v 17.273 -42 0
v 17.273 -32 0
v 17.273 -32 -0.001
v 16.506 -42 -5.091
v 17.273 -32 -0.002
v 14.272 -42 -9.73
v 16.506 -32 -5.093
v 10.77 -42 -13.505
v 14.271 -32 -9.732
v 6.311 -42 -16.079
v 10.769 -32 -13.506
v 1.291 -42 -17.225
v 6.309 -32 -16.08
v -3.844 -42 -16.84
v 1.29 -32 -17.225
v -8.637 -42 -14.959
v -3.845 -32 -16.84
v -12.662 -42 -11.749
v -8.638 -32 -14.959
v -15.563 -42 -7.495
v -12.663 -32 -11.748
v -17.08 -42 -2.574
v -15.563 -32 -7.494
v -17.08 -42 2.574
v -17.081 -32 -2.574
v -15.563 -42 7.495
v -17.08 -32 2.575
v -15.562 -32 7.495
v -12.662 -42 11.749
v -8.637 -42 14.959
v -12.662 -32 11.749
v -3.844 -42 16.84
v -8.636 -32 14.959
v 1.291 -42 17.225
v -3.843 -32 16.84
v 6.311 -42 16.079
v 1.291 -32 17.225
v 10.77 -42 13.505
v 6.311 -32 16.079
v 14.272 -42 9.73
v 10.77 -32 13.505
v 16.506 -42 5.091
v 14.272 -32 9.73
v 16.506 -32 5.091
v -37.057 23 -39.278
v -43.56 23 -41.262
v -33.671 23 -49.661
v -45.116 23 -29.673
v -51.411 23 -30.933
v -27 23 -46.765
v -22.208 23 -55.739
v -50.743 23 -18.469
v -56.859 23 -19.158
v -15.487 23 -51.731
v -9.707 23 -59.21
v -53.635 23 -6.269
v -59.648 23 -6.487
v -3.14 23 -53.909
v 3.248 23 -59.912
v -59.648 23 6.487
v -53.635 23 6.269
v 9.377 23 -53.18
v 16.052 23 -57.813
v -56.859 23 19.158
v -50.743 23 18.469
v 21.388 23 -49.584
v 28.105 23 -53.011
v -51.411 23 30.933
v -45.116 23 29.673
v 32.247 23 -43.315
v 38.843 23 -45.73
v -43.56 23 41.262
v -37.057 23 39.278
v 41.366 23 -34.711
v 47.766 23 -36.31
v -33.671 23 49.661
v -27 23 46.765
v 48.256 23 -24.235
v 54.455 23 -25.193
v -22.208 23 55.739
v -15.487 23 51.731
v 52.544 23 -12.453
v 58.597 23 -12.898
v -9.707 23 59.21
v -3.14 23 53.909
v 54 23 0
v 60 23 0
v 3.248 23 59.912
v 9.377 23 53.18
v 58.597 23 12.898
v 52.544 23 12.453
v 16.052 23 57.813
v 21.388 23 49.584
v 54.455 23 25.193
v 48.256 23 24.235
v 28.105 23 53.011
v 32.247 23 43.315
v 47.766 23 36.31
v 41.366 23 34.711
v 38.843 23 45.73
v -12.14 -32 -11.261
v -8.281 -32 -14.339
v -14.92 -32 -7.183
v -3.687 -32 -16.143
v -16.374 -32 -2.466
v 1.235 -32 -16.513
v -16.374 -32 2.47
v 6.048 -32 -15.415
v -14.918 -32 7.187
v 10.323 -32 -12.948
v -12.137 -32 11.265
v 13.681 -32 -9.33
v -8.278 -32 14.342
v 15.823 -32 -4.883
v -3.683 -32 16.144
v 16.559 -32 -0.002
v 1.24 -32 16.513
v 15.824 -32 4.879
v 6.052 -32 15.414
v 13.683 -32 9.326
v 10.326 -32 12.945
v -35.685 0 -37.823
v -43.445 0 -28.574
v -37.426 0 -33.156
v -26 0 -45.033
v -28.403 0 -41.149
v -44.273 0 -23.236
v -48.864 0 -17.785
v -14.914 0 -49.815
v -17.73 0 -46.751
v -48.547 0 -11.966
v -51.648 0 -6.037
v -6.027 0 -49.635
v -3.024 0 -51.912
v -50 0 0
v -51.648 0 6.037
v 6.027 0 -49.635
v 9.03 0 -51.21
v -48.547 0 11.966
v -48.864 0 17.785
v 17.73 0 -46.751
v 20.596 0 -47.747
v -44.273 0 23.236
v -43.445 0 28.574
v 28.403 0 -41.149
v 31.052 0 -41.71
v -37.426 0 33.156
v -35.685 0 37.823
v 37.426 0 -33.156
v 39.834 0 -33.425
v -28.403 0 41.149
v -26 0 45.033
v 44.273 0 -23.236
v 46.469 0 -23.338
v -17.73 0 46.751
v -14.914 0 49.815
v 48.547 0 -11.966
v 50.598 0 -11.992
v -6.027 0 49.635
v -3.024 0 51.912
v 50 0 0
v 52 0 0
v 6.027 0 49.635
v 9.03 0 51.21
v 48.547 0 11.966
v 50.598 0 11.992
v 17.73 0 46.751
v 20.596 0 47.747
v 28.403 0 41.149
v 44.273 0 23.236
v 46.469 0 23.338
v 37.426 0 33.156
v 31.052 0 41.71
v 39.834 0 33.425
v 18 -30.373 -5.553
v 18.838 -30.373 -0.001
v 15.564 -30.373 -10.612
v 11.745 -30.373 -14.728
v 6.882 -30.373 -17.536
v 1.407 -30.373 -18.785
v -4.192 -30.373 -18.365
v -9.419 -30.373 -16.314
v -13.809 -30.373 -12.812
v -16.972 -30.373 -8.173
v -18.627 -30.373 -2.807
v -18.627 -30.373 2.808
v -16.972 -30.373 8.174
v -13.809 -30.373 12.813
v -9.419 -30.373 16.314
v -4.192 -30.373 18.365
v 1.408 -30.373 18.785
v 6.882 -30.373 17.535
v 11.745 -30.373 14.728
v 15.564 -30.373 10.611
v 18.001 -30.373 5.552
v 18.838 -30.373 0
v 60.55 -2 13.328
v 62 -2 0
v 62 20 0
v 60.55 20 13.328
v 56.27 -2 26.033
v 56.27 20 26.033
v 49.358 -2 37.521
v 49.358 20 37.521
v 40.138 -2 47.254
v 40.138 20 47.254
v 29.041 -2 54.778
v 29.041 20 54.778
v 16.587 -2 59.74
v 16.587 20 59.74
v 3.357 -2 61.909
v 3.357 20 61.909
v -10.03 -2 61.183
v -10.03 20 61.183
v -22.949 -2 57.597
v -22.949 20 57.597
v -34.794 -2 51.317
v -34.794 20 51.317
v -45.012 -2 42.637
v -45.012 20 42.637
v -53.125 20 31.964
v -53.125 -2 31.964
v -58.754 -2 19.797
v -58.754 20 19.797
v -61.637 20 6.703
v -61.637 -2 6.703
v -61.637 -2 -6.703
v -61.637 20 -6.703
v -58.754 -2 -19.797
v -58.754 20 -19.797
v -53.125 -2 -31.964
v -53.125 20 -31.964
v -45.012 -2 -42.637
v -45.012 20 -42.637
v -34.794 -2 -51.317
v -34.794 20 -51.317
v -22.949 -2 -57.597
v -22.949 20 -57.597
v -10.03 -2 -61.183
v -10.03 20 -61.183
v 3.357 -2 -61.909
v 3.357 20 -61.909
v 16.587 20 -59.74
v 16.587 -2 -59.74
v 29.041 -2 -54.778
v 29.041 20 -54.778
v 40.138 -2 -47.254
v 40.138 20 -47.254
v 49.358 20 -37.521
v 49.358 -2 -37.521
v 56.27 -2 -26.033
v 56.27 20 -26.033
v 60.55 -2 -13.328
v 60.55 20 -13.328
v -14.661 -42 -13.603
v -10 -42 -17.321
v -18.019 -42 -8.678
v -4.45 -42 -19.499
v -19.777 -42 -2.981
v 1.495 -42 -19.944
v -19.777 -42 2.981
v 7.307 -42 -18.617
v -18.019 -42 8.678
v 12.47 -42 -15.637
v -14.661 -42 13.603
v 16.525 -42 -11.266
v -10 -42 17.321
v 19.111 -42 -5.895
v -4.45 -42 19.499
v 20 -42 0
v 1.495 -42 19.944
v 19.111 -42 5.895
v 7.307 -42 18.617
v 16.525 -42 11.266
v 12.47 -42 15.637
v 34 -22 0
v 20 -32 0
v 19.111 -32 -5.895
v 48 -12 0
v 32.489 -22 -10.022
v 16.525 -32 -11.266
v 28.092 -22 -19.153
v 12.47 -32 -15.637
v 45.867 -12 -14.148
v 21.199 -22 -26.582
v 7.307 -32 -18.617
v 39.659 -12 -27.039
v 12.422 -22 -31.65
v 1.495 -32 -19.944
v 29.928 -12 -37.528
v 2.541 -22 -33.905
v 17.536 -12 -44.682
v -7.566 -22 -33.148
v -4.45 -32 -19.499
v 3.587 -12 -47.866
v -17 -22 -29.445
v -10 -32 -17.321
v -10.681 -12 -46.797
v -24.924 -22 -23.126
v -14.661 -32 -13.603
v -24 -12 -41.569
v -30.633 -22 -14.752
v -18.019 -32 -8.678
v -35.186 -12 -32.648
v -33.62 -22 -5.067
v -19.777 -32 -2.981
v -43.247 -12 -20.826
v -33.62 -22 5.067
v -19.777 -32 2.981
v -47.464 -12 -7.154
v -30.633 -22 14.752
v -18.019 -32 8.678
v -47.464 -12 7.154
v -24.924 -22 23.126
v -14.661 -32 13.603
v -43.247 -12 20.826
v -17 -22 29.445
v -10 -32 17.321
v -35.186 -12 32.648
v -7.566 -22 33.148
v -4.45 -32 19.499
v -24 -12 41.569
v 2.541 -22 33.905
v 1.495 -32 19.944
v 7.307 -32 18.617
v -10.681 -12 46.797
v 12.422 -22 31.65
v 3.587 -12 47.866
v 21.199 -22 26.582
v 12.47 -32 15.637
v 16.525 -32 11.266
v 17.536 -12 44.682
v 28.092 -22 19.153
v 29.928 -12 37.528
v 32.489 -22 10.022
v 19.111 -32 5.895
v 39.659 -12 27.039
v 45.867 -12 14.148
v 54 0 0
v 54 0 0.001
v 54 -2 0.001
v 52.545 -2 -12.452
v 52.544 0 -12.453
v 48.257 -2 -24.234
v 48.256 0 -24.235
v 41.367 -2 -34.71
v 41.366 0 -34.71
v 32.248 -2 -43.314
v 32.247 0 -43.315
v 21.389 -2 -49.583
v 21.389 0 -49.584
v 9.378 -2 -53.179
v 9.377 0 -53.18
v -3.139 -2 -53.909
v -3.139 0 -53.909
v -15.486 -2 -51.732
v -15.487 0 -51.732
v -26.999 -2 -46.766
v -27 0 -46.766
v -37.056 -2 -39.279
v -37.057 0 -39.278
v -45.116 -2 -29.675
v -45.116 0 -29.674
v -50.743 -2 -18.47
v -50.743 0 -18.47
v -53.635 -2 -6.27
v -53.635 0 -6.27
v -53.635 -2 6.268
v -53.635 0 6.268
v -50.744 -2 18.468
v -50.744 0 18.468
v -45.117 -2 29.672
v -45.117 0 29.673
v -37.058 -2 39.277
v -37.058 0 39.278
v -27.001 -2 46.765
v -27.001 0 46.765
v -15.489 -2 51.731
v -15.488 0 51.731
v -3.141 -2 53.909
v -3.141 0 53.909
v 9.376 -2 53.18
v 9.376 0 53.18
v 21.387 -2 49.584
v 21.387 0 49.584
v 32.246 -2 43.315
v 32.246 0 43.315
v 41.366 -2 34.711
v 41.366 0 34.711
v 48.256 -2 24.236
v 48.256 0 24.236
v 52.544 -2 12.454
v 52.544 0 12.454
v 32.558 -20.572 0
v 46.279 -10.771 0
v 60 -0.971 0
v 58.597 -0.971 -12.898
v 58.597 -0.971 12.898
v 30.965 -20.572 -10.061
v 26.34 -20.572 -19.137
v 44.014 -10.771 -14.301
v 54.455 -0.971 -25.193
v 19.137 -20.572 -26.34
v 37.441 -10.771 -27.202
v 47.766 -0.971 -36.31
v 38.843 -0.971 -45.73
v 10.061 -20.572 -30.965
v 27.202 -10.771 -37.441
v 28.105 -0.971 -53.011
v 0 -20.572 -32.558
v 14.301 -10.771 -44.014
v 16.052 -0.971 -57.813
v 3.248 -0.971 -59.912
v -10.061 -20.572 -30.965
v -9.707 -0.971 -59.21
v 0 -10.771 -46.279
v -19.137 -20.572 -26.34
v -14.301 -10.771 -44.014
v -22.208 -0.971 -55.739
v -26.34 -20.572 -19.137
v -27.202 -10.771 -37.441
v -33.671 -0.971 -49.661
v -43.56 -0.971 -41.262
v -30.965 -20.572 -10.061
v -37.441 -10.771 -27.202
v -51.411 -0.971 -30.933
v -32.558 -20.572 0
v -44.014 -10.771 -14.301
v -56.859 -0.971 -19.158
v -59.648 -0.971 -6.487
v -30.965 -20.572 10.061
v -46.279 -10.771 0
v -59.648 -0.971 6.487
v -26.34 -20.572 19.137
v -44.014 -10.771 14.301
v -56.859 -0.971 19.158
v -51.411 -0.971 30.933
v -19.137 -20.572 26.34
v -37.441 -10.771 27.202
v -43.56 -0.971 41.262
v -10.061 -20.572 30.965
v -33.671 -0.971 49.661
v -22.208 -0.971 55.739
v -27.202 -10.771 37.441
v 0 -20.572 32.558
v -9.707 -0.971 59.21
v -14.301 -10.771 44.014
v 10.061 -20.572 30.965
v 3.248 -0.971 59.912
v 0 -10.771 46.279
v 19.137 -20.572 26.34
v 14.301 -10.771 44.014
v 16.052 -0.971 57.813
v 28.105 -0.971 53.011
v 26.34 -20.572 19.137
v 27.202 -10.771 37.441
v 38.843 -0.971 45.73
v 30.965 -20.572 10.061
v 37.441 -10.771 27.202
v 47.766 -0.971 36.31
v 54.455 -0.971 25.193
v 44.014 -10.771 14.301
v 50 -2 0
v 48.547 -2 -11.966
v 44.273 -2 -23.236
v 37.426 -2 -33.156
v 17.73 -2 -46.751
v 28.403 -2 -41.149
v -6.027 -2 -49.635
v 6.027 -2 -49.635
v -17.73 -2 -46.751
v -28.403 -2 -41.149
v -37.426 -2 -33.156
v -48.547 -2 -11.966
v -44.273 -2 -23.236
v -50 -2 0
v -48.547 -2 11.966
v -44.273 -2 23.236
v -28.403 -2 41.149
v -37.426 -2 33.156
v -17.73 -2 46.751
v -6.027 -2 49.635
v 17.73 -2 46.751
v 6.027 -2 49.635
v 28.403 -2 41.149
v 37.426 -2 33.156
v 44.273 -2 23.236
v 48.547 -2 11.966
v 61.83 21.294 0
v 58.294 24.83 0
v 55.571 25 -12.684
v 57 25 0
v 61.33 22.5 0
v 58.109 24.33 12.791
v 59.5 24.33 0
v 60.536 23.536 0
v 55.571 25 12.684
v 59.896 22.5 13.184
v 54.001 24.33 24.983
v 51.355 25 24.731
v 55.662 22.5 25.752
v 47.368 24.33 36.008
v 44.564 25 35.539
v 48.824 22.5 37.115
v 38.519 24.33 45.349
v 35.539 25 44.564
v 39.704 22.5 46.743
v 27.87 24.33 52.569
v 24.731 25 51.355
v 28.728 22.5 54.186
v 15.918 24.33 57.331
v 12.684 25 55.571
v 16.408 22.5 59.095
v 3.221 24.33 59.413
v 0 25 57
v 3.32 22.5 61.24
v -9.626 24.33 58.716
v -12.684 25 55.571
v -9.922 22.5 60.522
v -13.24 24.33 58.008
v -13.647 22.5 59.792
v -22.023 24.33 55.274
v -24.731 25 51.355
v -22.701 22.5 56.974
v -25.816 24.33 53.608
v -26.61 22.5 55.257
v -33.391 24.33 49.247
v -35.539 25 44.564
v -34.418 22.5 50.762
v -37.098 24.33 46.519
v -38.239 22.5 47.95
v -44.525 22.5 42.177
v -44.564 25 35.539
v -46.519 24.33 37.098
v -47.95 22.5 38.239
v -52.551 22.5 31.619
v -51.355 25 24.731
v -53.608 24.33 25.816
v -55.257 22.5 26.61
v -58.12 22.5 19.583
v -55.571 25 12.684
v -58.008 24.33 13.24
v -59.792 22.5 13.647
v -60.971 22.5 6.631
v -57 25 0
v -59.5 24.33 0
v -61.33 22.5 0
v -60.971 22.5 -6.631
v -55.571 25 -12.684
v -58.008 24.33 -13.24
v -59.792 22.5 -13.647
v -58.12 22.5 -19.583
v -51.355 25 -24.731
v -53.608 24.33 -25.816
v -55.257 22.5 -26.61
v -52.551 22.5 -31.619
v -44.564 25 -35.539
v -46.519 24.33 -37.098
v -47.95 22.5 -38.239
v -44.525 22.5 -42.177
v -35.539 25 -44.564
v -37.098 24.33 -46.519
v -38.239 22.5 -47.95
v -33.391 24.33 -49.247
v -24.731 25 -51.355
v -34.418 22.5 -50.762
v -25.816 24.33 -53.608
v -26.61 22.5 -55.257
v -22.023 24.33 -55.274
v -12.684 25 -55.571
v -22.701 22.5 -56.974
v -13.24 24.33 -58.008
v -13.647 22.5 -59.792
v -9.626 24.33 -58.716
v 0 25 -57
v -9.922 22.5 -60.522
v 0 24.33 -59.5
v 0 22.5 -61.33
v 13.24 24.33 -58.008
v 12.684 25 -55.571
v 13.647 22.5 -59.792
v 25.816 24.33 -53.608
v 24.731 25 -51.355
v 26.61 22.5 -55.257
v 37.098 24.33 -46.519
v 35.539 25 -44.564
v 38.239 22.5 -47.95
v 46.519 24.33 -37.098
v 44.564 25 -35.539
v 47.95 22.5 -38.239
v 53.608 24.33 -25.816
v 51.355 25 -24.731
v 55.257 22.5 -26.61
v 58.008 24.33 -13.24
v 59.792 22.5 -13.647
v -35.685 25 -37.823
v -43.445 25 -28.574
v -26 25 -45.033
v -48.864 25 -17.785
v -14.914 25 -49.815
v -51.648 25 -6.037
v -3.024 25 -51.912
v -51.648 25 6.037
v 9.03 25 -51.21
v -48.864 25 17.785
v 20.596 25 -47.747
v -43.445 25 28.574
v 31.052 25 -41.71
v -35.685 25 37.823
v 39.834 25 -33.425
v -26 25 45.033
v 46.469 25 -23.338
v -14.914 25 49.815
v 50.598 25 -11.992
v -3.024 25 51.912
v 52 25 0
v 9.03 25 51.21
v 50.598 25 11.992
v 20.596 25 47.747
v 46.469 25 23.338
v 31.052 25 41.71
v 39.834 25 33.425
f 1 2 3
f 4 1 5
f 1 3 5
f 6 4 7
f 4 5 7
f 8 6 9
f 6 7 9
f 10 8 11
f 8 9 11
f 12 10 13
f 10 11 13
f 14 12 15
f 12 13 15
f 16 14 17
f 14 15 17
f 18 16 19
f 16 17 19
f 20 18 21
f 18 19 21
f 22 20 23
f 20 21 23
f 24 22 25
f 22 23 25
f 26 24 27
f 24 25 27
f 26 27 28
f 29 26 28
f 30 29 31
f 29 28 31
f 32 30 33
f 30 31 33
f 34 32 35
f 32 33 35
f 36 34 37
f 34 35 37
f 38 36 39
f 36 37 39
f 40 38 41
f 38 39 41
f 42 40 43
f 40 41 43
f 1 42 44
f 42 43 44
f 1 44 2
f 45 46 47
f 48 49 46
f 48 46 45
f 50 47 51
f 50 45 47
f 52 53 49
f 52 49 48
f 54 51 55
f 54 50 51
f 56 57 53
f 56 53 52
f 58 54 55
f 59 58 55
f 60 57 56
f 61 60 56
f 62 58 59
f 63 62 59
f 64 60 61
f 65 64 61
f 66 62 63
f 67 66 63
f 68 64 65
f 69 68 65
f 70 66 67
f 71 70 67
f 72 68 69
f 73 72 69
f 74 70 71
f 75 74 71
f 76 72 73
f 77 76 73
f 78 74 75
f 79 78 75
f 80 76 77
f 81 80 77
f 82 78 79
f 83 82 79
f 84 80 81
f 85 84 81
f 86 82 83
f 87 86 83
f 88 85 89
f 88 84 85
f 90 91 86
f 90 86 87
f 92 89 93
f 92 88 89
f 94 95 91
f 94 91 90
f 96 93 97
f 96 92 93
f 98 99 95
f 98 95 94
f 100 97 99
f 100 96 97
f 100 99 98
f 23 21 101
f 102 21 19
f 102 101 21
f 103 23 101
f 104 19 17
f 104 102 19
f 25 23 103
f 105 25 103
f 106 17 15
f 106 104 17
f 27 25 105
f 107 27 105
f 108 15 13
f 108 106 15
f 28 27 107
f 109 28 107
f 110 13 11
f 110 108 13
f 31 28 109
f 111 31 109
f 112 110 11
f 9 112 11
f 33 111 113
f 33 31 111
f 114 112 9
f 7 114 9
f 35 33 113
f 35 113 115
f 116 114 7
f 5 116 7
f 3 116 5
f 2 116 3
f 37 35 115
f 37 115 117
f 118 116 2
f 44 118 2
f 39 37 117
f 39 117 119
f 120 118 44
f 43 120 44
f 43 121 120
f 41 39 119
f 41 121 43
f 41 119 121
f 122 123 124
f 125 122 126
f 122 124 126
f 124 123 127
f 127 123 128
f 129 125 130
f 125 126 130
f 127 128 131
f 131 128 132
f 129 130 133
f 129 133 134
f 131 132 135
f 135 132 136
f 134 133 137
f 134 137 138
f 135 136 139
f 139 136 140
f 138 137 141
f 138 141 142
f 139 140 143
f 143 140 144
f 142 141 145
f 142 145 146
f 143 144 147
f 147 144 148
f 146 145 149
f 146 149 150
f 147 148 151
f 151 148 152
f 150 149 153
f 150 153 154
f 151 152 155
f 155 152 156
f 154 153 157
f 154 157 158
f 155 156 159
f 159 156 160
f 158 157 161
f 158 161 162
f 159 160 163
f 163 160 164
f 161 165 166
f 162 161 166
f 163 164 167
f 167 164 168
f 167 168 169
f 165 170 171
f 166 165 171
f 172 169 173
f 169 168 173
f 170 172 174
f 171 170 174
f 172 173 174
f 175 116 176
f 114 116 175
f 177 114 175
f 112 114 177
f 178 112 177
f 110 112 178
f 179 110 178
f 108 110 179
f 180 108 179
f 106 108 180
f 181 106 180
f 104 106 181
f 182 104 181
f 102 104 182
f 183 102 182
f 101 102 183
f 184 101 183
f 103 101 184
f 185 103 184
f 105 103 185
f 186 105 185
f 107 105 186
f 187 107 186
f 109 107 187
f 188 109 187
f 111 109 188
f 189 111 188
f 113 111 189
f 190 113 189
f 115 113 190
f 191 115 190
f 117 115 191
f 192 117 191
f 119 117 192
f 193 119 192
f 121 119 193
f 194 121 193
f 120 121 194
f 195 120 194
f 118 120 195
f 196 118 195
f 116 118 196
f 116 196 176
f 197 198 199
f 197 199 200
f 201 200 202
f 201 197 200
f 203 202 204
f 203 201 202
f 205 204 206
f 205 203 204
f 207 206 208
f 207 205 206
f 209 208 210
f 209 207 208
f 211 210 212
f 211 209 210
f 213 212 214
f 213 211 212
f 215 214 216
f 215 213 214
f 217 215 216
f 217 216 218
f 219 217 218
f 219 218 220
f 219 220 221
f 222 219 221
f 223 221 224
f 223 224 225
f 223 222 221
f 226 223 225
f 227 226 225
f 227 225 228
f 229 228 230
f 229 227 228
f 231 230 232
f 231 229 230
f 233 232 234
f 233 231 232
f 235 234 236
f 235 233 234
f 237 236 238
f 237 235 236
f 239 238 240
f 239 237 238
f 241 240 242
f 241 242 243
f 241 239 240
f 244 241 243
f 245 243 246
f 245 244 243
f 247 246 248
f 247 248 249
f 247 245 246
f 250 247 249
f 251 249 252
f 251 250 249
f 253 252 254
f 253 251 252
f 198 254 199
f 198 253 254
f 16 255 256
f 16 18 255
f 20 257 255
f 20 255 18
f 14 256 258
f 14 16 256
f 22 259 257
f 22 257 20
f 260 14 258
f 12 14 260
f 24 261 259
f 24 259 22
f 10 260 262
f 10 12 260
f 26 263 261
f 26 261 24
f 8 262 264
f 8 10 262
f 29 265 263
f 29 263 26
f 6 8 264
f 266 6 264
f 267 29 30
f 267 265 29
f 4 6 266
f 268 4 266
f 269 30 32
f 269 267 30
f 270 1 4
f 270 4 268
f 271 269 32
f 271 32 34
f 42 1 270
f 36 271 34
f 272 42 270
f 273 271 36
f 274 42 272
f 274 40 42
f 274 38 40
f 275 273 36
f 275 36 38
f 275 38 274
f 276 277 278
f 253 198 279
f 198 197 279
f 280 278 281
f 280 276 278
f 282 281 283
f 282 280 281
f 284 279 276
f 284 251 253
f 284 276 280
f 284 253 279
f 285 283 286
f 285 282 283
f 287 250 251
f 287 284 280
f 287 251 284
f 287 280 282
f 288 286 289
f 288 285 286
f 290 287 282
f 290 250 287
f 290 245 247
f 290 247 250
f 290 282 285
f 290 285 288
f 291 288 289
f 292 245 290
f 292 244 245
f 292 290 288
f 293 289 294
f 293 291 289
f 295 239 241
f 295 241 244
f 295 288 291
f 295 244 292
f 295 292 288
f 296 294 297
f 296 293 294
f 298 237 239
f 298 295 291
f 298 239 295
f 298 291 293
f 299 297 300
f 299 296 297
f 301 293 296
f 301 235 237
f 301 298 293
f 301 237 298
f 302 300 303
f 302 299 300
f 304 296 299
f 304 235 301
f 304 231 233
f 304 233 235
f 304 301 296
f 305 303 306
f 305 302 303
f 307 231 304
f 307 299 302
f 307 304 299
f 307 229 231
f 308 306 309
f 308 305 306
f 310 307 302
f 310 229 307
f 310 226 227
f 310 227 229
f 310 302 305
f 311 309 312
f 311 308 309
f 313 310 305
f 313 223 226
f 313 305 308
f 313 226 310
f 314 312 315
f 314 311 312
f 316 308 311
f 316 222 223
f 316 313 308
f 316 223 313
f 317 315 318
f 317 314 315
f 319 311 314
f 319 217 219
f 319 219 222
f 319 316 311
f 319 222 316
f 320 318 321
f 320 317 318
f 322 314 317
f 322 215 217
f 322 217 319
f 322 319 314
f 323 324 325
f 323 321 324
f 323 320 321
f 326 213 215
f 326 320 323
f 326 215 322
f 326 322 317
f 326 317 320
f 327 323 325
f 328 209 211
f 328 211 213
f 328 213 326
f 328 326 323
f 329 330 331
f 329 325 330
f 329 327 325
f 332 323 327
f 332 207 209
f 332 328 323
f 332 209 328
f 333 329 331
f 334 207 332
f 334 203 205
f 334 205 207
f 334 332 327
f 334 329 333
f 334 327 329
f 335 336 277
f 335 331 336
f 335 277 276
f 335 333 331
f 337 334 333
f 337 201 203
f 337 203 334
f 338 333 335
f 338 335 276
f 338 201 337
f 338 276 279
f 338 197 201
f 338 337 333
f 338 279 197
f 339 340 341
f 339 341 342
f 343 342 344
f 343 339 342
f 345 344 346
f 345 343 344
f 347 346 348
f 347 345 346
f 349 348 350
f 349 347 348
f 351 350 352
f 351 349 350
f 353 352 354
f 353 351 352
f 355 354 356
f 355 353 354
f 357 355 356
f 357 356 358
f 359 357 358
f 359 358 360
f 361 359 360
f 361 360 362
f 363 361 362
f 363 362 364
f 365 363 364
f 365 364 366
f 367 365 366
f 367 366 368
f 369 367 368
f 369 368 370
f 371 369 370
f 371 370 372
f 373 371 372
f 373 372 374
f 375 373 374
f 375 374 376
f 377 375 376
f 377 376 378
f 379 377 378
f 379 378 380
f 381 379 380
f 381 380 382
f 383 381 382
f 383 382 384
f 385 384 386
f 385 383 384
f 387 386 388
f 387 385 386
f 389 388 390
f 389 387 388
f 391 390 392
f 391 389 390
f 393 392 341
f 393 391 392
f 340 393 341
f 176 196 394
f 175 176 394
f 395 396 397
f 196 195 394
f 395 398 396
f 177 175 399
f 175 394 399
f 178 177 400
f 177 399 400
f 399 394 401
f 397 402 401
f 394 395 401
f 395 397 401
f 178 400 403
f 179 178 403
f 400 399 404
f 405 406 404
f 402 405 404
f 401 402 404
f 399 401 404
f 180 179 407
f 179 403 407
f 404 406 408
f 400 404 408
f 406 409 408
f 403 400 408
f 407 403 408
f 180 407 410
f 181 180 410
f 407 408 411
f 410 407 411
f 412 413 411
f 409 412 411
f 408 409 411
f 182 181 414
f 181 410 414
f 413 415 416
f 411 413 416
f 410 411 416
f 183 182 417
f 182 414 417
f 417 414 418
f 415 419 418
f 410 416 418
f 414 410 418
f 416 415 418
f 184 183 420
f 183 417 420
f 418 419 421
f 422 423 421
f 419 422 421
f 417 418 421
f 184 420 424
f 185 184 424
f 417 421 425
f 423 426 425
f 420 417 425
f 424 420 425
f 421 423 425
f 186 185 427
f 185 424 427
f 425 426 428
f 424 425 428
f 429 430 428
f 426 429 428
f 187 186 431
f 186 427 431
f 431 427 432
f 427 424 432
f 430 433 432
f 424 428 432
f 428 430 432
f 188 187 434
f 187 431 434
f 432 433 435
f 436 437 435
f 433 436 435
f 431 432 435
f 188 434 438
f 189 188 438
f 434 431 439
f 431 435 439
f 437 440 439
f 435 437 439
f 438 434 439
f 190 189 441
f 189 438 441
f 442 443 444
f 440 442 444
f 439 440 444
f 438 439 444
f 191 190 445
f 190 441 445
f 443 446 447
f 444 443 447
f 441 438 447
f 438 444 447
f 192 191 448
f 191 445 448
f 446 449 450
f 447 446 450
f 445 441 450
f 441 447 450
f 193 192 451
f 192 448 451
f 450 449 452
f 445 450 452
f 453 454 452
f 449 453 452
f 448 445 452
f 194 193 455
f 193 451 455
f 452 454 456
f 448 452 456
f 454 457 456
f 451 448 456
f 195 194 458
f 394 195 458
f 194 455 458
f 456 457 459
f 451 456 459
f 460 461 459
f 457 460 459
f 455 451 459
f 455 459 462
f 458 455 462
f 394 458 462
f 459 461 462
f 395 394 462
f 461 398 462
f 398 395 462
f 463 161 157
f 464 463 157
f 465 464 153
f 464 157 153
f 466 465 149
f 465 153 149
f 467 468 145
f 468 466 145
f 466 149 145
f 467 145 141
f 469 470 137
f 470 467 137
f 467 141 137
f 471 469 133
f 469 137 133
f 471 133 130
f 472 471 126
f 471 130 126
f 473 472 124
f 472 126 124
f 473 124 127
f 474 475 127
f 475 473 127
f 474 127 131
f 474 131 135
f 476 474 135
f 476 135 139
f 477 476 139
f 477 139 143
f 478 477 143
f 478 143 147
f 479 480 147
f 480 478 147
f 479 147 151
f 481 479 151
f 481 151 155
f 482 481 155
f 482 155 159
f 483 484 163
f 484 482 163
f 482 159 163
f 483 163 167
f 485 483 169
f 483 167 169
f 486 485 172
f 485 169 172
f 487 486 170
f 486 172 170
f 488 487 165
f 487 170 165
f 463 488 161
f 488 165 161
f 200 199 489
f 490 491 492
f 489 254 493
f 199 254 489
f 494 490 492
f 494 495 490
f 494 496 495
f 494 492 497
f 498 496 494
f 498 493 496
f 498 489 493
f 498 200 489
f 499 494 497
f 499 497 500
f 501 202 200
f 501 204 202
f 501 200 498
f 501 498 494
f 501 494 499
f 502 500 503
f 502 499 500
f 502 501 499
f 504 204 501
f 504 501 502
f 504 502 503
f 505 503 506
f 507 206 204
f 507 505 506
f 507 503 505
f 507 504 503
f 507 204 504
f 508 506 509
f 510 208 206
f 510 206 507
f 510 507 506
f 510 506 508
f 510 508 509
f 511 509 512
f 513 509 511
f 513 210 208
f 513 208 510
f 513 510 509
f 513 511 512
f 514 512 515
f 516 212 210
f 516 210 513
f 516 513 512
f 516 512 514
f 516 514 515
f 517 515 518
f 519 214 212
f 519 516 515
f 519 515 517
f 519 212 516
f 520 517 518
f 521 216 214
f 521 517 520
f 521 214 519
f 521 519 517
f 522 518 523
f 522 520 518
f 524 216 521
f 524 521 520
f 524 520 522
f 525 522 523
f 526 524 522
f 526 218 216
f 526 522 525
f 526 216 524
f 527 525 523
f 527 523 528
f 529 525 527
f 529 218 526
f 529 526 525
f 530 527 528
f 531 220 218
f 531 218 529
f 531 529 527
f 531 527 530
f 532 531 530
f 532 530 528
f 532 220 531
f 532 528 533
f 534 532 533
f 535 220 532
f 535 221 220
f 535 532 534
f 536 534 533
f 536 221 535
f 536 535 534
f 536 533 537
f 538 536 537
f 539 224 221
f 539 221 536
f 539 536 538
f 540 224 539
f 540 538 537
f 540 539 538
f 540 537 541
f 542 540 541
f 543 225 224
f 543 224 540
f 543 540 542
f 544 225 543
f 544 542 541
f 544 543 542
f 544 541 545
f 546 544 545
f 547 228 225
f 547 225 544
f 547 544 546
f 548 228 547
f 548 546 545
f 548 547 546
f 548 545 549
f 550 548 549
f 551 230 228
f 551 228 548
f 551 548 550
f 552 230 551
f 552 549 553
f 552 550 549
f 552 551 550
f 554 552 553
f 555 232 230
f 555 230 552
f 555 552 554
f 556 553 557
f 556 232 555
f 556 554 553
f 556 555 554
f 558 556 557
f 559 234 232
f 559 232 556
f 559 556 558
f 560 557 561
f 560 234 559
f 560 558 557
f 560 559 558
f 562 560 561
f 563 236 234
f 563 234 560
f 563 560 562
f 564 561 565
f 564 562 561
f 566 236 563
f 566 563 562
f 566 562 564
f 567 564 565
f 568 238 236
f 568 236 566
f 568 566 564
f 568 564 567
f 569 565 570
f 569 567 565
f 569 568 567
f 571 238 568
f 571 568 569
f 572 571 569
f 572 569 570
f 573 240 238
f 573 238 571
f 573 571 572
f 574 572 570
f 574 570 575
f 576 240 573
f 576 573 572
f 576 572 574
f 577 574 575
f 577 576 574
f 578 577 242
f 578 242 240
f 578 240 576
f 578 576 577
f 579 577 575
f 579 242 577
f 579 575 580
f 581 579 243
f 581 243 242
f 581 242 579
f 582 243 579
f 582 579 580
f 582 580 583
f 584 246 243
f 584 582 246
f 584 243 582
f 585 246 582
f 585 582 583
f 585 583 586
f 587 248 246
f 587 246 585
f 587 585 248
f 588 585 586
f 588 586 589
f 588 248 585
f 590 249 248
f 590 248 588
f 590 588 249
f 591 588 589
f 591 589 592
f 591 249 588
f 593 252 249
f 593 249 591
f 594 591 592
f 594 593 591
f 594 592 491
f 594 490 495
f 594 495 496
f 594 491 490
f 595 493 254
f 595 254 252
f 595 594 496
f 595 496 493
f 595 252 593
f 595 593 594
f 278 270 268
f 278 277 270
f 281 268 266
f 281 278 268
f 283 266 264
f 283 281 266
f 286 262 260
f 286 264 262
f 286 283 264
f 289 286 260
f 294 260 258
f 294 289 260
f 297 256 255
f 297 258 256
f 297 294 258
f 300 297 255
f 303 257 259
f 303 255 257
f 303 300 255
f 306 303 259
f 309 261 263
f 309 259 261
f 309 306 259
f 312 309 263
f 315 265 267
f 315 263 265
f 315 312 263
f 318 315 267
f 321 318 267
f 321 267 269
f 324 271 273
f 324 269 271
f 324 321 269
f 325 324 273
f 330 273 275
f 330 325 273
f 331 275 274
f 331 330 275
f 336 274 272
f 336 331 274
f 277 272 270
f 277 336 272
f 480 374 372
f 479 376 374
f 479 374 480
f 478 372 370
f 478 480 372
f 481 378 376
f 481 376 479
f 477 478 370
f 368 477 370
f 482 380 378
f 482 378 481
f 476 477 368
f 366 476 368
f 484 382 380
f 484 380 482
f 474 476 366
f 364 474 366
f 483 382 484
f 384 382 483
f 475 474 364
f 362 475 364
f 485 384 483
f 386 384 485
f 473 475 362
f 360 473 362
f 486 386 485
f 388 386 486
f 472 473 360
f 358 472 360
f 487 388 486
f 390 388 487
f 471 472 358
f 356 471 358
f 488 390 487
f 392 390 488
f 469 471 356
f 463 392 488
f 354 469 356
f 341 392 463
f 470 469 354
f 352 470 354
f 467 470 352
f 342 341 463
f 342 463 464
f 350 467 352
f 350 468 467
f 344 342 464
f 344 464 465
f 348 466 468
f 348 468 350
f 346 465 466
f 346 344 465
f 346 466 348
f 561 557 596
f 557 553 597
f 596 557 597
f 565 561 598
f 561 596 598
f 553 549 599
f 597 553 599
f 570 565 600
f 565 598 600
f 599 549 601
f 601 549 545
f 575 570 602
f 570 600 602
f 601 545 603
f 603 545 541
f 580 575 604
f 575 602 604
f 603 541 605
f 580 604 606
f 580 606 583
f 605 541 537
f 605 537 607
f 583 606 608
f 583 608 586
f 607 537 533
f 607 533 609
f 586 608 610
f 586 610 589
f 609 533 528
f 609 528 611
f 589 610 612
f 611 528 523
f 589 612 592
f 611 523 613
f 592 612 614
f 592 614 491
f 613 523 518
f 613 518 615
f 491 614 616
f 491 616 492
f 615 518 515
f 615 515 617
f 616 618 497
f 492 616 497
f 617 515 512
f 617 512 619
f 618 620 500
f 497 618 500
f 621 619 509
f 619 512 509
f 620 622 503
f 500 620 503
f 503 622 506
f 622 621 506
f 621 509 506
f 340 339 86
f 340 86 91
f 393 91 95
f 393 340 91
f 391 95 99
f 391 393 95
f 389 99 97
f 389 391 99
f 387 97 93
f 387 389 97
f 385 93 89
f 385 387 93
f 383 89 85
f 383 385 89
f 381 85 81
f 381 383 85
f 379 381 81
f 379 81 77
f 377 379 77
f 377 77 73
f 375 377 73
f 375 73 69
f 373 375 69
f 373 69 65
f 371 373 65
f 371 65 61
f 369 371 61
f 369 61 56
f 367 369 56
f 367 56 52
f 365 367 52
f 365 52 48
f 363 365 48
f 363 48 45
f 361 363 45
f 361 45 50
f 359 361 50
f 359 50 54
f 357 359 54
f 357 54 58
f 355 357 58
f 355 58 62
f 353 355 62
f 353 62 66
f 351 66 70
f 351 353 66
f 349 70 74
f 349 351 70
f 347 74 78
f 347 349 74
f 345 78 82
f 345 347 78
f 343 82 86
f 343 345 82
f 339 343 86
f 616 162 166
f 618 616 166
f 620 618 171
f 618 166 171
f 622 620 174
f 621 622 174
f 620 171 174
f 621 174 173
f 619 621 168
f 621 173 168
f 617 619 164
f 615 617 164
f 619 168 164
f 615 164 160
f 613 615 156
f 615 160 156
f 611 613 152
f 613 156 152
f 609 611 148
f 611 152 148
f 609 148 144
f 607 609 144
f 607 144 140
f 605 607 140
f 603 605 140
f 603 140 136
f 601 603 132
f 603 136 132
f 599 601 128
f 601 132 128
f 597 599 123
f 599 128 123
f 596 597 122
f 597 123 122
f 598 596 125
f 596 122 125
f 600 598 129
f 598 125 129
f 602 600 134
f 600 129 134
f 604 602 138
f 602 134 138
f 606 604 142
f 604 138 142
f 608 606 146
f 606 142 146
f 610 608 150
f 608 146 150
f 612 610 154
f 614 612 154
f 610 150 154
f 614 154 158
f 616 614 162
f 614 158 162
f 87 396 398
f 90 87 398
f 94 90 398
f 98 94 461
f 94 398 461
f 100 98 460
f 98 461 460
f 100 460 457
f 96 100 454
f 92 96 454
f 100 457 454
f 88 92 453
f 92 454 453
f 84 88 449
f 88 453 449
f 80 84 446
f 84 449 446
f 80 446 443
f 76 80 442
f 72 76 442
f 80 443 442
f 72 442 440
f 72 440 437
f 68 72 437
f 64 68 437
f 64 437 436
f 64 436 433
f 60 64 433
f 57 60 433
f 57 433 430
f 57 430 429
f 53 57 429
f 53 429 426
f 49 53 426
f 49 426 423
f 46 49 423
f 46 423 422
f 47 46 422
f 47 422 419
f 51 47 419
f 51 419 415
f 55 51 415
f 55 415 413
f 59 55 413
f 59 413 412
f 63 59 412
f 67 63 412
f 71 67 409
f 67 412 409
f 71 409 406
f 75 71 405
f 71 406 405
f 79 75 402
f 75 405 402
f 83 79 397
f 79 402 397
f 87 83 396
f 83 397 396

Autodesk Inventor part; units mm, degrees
ref_plane "YZ Plane" through (0, 0, 0) normal (1, 0, 0) x (0, 1, 0)
ref_plane "XZ Plane" through (0, 0, 0) normal (0, 1, 0) x (-1, 0, 0)
ref_plane "Work Plane1" through (0, 0, 0) normal (0, -1, 0) x (1, 0, 0)
sketch "Sketch1" plane through (0, 0, 0) normal (0, -1, 0) x (1, 0, 0)
  circle A0 centre (0, 0) radius 52 projected
  circle A1 centre (0, 0) radius 62
  circle A2 centre (0, 0) radius 52
  dimension "d1" = 10
extrude "Extrusion1" add sketch "Sketch1" against normal blind 25
sketch "Sketch3" plane through (0, 0, 0) normal (0, -1, 0) x (1, 0, 0)
  circle A0 centre (0, 0) radius 62
  circle A1 centre (0, 0) radius 50
  circle A2 centre (0, 0) radius 52 projected
  dimension "d9" = 124
  dimension "d10" = 2
extrude "Extrusion3" add sketch "Sketch3" along normal blind 2 contours A0 | A2
sketch "Sketch4" plane through (0, -2, 0) normal (0, -1, 0) x (1, 0, 0)
  circle A0 centre (0, 0) radius 62 construction
  line L0 (-62, 0) -> (62, 0) construction
  line L1 (0, 62) -> (0, -62) construction
ref_plane "Work Plane2" through (-62, -2, 0) normal (0, 0, 1) x (1, 0, 0)
sketch "Sketch5" plane through (-62, -2, 0) normal (0, 0, 1) x (1, 0, 0)
  line L0 (0, 0) -> (124, 0) construction
  line L1 (62, 0) -> (62, -30) construction
  line L2 (62, 0) -> (62, -30) construction
  line L3 (82, -30) -> (124, 0) construction
  line L4 (62, 0) -> (62, -30) construction
  line L5 (62, 0) -> (62, -30)
  line L6 (82, -30) -> (124, 0)
  line L7 (62, 0) -> (124, 0)
  line L8 (82, -30) -> (62, -30)
  point P0 (62, 2)
  dimension "d14" = 20
  dimension "d23" = 30
revolve "Revolution1" add sketch "Sketch5" angle 360 about axis through (0, -2, 0) along (0, -1, 0)
shell "Shell1" thickness 2 removed faces 2 at (9.39, -2, -8.8667) at (-4.4202, -32, 2.9181)
fillet "Fillet2" radius 5 1 edges at (-62, 25, 0)
sketch "Sketch6" plane through (0, -32, 0) normal (0, -1, 0) x (1, 0, 0)
  circle A0 centre (0, 0) radius 20
  circle A1 centre (0, 0) radius 17.2734
  point P0 (0, 0)
extrude "Extrusion4" add sketch "Sketch6" along normal blind 10
sketch "Sketch7" plane through (-62, -2, 0) normal (0, 0, 1) x (1, 0, 0)
  line L0 (116, 0) -> (8, 0) construction
  line L1 (62, 0) -> (62, -68.8676) construction
  line L2 (62, -68.8676) -> (62, 58.2557) construction
  point P0 (62, 2)
sketch "Sketch8" plane through (0, -42, 0) normal (0, -1, 0) x (1, 0, 0)
  circle A0 centre (0, 0) radius 17.2734 construction
  circle A1 centre (0, 0) radius 20 construction
  point P0 (0, 0)
  dimension "d21" = 34.5467
  dimension "d22" = 40
properties part number "JarCone"
